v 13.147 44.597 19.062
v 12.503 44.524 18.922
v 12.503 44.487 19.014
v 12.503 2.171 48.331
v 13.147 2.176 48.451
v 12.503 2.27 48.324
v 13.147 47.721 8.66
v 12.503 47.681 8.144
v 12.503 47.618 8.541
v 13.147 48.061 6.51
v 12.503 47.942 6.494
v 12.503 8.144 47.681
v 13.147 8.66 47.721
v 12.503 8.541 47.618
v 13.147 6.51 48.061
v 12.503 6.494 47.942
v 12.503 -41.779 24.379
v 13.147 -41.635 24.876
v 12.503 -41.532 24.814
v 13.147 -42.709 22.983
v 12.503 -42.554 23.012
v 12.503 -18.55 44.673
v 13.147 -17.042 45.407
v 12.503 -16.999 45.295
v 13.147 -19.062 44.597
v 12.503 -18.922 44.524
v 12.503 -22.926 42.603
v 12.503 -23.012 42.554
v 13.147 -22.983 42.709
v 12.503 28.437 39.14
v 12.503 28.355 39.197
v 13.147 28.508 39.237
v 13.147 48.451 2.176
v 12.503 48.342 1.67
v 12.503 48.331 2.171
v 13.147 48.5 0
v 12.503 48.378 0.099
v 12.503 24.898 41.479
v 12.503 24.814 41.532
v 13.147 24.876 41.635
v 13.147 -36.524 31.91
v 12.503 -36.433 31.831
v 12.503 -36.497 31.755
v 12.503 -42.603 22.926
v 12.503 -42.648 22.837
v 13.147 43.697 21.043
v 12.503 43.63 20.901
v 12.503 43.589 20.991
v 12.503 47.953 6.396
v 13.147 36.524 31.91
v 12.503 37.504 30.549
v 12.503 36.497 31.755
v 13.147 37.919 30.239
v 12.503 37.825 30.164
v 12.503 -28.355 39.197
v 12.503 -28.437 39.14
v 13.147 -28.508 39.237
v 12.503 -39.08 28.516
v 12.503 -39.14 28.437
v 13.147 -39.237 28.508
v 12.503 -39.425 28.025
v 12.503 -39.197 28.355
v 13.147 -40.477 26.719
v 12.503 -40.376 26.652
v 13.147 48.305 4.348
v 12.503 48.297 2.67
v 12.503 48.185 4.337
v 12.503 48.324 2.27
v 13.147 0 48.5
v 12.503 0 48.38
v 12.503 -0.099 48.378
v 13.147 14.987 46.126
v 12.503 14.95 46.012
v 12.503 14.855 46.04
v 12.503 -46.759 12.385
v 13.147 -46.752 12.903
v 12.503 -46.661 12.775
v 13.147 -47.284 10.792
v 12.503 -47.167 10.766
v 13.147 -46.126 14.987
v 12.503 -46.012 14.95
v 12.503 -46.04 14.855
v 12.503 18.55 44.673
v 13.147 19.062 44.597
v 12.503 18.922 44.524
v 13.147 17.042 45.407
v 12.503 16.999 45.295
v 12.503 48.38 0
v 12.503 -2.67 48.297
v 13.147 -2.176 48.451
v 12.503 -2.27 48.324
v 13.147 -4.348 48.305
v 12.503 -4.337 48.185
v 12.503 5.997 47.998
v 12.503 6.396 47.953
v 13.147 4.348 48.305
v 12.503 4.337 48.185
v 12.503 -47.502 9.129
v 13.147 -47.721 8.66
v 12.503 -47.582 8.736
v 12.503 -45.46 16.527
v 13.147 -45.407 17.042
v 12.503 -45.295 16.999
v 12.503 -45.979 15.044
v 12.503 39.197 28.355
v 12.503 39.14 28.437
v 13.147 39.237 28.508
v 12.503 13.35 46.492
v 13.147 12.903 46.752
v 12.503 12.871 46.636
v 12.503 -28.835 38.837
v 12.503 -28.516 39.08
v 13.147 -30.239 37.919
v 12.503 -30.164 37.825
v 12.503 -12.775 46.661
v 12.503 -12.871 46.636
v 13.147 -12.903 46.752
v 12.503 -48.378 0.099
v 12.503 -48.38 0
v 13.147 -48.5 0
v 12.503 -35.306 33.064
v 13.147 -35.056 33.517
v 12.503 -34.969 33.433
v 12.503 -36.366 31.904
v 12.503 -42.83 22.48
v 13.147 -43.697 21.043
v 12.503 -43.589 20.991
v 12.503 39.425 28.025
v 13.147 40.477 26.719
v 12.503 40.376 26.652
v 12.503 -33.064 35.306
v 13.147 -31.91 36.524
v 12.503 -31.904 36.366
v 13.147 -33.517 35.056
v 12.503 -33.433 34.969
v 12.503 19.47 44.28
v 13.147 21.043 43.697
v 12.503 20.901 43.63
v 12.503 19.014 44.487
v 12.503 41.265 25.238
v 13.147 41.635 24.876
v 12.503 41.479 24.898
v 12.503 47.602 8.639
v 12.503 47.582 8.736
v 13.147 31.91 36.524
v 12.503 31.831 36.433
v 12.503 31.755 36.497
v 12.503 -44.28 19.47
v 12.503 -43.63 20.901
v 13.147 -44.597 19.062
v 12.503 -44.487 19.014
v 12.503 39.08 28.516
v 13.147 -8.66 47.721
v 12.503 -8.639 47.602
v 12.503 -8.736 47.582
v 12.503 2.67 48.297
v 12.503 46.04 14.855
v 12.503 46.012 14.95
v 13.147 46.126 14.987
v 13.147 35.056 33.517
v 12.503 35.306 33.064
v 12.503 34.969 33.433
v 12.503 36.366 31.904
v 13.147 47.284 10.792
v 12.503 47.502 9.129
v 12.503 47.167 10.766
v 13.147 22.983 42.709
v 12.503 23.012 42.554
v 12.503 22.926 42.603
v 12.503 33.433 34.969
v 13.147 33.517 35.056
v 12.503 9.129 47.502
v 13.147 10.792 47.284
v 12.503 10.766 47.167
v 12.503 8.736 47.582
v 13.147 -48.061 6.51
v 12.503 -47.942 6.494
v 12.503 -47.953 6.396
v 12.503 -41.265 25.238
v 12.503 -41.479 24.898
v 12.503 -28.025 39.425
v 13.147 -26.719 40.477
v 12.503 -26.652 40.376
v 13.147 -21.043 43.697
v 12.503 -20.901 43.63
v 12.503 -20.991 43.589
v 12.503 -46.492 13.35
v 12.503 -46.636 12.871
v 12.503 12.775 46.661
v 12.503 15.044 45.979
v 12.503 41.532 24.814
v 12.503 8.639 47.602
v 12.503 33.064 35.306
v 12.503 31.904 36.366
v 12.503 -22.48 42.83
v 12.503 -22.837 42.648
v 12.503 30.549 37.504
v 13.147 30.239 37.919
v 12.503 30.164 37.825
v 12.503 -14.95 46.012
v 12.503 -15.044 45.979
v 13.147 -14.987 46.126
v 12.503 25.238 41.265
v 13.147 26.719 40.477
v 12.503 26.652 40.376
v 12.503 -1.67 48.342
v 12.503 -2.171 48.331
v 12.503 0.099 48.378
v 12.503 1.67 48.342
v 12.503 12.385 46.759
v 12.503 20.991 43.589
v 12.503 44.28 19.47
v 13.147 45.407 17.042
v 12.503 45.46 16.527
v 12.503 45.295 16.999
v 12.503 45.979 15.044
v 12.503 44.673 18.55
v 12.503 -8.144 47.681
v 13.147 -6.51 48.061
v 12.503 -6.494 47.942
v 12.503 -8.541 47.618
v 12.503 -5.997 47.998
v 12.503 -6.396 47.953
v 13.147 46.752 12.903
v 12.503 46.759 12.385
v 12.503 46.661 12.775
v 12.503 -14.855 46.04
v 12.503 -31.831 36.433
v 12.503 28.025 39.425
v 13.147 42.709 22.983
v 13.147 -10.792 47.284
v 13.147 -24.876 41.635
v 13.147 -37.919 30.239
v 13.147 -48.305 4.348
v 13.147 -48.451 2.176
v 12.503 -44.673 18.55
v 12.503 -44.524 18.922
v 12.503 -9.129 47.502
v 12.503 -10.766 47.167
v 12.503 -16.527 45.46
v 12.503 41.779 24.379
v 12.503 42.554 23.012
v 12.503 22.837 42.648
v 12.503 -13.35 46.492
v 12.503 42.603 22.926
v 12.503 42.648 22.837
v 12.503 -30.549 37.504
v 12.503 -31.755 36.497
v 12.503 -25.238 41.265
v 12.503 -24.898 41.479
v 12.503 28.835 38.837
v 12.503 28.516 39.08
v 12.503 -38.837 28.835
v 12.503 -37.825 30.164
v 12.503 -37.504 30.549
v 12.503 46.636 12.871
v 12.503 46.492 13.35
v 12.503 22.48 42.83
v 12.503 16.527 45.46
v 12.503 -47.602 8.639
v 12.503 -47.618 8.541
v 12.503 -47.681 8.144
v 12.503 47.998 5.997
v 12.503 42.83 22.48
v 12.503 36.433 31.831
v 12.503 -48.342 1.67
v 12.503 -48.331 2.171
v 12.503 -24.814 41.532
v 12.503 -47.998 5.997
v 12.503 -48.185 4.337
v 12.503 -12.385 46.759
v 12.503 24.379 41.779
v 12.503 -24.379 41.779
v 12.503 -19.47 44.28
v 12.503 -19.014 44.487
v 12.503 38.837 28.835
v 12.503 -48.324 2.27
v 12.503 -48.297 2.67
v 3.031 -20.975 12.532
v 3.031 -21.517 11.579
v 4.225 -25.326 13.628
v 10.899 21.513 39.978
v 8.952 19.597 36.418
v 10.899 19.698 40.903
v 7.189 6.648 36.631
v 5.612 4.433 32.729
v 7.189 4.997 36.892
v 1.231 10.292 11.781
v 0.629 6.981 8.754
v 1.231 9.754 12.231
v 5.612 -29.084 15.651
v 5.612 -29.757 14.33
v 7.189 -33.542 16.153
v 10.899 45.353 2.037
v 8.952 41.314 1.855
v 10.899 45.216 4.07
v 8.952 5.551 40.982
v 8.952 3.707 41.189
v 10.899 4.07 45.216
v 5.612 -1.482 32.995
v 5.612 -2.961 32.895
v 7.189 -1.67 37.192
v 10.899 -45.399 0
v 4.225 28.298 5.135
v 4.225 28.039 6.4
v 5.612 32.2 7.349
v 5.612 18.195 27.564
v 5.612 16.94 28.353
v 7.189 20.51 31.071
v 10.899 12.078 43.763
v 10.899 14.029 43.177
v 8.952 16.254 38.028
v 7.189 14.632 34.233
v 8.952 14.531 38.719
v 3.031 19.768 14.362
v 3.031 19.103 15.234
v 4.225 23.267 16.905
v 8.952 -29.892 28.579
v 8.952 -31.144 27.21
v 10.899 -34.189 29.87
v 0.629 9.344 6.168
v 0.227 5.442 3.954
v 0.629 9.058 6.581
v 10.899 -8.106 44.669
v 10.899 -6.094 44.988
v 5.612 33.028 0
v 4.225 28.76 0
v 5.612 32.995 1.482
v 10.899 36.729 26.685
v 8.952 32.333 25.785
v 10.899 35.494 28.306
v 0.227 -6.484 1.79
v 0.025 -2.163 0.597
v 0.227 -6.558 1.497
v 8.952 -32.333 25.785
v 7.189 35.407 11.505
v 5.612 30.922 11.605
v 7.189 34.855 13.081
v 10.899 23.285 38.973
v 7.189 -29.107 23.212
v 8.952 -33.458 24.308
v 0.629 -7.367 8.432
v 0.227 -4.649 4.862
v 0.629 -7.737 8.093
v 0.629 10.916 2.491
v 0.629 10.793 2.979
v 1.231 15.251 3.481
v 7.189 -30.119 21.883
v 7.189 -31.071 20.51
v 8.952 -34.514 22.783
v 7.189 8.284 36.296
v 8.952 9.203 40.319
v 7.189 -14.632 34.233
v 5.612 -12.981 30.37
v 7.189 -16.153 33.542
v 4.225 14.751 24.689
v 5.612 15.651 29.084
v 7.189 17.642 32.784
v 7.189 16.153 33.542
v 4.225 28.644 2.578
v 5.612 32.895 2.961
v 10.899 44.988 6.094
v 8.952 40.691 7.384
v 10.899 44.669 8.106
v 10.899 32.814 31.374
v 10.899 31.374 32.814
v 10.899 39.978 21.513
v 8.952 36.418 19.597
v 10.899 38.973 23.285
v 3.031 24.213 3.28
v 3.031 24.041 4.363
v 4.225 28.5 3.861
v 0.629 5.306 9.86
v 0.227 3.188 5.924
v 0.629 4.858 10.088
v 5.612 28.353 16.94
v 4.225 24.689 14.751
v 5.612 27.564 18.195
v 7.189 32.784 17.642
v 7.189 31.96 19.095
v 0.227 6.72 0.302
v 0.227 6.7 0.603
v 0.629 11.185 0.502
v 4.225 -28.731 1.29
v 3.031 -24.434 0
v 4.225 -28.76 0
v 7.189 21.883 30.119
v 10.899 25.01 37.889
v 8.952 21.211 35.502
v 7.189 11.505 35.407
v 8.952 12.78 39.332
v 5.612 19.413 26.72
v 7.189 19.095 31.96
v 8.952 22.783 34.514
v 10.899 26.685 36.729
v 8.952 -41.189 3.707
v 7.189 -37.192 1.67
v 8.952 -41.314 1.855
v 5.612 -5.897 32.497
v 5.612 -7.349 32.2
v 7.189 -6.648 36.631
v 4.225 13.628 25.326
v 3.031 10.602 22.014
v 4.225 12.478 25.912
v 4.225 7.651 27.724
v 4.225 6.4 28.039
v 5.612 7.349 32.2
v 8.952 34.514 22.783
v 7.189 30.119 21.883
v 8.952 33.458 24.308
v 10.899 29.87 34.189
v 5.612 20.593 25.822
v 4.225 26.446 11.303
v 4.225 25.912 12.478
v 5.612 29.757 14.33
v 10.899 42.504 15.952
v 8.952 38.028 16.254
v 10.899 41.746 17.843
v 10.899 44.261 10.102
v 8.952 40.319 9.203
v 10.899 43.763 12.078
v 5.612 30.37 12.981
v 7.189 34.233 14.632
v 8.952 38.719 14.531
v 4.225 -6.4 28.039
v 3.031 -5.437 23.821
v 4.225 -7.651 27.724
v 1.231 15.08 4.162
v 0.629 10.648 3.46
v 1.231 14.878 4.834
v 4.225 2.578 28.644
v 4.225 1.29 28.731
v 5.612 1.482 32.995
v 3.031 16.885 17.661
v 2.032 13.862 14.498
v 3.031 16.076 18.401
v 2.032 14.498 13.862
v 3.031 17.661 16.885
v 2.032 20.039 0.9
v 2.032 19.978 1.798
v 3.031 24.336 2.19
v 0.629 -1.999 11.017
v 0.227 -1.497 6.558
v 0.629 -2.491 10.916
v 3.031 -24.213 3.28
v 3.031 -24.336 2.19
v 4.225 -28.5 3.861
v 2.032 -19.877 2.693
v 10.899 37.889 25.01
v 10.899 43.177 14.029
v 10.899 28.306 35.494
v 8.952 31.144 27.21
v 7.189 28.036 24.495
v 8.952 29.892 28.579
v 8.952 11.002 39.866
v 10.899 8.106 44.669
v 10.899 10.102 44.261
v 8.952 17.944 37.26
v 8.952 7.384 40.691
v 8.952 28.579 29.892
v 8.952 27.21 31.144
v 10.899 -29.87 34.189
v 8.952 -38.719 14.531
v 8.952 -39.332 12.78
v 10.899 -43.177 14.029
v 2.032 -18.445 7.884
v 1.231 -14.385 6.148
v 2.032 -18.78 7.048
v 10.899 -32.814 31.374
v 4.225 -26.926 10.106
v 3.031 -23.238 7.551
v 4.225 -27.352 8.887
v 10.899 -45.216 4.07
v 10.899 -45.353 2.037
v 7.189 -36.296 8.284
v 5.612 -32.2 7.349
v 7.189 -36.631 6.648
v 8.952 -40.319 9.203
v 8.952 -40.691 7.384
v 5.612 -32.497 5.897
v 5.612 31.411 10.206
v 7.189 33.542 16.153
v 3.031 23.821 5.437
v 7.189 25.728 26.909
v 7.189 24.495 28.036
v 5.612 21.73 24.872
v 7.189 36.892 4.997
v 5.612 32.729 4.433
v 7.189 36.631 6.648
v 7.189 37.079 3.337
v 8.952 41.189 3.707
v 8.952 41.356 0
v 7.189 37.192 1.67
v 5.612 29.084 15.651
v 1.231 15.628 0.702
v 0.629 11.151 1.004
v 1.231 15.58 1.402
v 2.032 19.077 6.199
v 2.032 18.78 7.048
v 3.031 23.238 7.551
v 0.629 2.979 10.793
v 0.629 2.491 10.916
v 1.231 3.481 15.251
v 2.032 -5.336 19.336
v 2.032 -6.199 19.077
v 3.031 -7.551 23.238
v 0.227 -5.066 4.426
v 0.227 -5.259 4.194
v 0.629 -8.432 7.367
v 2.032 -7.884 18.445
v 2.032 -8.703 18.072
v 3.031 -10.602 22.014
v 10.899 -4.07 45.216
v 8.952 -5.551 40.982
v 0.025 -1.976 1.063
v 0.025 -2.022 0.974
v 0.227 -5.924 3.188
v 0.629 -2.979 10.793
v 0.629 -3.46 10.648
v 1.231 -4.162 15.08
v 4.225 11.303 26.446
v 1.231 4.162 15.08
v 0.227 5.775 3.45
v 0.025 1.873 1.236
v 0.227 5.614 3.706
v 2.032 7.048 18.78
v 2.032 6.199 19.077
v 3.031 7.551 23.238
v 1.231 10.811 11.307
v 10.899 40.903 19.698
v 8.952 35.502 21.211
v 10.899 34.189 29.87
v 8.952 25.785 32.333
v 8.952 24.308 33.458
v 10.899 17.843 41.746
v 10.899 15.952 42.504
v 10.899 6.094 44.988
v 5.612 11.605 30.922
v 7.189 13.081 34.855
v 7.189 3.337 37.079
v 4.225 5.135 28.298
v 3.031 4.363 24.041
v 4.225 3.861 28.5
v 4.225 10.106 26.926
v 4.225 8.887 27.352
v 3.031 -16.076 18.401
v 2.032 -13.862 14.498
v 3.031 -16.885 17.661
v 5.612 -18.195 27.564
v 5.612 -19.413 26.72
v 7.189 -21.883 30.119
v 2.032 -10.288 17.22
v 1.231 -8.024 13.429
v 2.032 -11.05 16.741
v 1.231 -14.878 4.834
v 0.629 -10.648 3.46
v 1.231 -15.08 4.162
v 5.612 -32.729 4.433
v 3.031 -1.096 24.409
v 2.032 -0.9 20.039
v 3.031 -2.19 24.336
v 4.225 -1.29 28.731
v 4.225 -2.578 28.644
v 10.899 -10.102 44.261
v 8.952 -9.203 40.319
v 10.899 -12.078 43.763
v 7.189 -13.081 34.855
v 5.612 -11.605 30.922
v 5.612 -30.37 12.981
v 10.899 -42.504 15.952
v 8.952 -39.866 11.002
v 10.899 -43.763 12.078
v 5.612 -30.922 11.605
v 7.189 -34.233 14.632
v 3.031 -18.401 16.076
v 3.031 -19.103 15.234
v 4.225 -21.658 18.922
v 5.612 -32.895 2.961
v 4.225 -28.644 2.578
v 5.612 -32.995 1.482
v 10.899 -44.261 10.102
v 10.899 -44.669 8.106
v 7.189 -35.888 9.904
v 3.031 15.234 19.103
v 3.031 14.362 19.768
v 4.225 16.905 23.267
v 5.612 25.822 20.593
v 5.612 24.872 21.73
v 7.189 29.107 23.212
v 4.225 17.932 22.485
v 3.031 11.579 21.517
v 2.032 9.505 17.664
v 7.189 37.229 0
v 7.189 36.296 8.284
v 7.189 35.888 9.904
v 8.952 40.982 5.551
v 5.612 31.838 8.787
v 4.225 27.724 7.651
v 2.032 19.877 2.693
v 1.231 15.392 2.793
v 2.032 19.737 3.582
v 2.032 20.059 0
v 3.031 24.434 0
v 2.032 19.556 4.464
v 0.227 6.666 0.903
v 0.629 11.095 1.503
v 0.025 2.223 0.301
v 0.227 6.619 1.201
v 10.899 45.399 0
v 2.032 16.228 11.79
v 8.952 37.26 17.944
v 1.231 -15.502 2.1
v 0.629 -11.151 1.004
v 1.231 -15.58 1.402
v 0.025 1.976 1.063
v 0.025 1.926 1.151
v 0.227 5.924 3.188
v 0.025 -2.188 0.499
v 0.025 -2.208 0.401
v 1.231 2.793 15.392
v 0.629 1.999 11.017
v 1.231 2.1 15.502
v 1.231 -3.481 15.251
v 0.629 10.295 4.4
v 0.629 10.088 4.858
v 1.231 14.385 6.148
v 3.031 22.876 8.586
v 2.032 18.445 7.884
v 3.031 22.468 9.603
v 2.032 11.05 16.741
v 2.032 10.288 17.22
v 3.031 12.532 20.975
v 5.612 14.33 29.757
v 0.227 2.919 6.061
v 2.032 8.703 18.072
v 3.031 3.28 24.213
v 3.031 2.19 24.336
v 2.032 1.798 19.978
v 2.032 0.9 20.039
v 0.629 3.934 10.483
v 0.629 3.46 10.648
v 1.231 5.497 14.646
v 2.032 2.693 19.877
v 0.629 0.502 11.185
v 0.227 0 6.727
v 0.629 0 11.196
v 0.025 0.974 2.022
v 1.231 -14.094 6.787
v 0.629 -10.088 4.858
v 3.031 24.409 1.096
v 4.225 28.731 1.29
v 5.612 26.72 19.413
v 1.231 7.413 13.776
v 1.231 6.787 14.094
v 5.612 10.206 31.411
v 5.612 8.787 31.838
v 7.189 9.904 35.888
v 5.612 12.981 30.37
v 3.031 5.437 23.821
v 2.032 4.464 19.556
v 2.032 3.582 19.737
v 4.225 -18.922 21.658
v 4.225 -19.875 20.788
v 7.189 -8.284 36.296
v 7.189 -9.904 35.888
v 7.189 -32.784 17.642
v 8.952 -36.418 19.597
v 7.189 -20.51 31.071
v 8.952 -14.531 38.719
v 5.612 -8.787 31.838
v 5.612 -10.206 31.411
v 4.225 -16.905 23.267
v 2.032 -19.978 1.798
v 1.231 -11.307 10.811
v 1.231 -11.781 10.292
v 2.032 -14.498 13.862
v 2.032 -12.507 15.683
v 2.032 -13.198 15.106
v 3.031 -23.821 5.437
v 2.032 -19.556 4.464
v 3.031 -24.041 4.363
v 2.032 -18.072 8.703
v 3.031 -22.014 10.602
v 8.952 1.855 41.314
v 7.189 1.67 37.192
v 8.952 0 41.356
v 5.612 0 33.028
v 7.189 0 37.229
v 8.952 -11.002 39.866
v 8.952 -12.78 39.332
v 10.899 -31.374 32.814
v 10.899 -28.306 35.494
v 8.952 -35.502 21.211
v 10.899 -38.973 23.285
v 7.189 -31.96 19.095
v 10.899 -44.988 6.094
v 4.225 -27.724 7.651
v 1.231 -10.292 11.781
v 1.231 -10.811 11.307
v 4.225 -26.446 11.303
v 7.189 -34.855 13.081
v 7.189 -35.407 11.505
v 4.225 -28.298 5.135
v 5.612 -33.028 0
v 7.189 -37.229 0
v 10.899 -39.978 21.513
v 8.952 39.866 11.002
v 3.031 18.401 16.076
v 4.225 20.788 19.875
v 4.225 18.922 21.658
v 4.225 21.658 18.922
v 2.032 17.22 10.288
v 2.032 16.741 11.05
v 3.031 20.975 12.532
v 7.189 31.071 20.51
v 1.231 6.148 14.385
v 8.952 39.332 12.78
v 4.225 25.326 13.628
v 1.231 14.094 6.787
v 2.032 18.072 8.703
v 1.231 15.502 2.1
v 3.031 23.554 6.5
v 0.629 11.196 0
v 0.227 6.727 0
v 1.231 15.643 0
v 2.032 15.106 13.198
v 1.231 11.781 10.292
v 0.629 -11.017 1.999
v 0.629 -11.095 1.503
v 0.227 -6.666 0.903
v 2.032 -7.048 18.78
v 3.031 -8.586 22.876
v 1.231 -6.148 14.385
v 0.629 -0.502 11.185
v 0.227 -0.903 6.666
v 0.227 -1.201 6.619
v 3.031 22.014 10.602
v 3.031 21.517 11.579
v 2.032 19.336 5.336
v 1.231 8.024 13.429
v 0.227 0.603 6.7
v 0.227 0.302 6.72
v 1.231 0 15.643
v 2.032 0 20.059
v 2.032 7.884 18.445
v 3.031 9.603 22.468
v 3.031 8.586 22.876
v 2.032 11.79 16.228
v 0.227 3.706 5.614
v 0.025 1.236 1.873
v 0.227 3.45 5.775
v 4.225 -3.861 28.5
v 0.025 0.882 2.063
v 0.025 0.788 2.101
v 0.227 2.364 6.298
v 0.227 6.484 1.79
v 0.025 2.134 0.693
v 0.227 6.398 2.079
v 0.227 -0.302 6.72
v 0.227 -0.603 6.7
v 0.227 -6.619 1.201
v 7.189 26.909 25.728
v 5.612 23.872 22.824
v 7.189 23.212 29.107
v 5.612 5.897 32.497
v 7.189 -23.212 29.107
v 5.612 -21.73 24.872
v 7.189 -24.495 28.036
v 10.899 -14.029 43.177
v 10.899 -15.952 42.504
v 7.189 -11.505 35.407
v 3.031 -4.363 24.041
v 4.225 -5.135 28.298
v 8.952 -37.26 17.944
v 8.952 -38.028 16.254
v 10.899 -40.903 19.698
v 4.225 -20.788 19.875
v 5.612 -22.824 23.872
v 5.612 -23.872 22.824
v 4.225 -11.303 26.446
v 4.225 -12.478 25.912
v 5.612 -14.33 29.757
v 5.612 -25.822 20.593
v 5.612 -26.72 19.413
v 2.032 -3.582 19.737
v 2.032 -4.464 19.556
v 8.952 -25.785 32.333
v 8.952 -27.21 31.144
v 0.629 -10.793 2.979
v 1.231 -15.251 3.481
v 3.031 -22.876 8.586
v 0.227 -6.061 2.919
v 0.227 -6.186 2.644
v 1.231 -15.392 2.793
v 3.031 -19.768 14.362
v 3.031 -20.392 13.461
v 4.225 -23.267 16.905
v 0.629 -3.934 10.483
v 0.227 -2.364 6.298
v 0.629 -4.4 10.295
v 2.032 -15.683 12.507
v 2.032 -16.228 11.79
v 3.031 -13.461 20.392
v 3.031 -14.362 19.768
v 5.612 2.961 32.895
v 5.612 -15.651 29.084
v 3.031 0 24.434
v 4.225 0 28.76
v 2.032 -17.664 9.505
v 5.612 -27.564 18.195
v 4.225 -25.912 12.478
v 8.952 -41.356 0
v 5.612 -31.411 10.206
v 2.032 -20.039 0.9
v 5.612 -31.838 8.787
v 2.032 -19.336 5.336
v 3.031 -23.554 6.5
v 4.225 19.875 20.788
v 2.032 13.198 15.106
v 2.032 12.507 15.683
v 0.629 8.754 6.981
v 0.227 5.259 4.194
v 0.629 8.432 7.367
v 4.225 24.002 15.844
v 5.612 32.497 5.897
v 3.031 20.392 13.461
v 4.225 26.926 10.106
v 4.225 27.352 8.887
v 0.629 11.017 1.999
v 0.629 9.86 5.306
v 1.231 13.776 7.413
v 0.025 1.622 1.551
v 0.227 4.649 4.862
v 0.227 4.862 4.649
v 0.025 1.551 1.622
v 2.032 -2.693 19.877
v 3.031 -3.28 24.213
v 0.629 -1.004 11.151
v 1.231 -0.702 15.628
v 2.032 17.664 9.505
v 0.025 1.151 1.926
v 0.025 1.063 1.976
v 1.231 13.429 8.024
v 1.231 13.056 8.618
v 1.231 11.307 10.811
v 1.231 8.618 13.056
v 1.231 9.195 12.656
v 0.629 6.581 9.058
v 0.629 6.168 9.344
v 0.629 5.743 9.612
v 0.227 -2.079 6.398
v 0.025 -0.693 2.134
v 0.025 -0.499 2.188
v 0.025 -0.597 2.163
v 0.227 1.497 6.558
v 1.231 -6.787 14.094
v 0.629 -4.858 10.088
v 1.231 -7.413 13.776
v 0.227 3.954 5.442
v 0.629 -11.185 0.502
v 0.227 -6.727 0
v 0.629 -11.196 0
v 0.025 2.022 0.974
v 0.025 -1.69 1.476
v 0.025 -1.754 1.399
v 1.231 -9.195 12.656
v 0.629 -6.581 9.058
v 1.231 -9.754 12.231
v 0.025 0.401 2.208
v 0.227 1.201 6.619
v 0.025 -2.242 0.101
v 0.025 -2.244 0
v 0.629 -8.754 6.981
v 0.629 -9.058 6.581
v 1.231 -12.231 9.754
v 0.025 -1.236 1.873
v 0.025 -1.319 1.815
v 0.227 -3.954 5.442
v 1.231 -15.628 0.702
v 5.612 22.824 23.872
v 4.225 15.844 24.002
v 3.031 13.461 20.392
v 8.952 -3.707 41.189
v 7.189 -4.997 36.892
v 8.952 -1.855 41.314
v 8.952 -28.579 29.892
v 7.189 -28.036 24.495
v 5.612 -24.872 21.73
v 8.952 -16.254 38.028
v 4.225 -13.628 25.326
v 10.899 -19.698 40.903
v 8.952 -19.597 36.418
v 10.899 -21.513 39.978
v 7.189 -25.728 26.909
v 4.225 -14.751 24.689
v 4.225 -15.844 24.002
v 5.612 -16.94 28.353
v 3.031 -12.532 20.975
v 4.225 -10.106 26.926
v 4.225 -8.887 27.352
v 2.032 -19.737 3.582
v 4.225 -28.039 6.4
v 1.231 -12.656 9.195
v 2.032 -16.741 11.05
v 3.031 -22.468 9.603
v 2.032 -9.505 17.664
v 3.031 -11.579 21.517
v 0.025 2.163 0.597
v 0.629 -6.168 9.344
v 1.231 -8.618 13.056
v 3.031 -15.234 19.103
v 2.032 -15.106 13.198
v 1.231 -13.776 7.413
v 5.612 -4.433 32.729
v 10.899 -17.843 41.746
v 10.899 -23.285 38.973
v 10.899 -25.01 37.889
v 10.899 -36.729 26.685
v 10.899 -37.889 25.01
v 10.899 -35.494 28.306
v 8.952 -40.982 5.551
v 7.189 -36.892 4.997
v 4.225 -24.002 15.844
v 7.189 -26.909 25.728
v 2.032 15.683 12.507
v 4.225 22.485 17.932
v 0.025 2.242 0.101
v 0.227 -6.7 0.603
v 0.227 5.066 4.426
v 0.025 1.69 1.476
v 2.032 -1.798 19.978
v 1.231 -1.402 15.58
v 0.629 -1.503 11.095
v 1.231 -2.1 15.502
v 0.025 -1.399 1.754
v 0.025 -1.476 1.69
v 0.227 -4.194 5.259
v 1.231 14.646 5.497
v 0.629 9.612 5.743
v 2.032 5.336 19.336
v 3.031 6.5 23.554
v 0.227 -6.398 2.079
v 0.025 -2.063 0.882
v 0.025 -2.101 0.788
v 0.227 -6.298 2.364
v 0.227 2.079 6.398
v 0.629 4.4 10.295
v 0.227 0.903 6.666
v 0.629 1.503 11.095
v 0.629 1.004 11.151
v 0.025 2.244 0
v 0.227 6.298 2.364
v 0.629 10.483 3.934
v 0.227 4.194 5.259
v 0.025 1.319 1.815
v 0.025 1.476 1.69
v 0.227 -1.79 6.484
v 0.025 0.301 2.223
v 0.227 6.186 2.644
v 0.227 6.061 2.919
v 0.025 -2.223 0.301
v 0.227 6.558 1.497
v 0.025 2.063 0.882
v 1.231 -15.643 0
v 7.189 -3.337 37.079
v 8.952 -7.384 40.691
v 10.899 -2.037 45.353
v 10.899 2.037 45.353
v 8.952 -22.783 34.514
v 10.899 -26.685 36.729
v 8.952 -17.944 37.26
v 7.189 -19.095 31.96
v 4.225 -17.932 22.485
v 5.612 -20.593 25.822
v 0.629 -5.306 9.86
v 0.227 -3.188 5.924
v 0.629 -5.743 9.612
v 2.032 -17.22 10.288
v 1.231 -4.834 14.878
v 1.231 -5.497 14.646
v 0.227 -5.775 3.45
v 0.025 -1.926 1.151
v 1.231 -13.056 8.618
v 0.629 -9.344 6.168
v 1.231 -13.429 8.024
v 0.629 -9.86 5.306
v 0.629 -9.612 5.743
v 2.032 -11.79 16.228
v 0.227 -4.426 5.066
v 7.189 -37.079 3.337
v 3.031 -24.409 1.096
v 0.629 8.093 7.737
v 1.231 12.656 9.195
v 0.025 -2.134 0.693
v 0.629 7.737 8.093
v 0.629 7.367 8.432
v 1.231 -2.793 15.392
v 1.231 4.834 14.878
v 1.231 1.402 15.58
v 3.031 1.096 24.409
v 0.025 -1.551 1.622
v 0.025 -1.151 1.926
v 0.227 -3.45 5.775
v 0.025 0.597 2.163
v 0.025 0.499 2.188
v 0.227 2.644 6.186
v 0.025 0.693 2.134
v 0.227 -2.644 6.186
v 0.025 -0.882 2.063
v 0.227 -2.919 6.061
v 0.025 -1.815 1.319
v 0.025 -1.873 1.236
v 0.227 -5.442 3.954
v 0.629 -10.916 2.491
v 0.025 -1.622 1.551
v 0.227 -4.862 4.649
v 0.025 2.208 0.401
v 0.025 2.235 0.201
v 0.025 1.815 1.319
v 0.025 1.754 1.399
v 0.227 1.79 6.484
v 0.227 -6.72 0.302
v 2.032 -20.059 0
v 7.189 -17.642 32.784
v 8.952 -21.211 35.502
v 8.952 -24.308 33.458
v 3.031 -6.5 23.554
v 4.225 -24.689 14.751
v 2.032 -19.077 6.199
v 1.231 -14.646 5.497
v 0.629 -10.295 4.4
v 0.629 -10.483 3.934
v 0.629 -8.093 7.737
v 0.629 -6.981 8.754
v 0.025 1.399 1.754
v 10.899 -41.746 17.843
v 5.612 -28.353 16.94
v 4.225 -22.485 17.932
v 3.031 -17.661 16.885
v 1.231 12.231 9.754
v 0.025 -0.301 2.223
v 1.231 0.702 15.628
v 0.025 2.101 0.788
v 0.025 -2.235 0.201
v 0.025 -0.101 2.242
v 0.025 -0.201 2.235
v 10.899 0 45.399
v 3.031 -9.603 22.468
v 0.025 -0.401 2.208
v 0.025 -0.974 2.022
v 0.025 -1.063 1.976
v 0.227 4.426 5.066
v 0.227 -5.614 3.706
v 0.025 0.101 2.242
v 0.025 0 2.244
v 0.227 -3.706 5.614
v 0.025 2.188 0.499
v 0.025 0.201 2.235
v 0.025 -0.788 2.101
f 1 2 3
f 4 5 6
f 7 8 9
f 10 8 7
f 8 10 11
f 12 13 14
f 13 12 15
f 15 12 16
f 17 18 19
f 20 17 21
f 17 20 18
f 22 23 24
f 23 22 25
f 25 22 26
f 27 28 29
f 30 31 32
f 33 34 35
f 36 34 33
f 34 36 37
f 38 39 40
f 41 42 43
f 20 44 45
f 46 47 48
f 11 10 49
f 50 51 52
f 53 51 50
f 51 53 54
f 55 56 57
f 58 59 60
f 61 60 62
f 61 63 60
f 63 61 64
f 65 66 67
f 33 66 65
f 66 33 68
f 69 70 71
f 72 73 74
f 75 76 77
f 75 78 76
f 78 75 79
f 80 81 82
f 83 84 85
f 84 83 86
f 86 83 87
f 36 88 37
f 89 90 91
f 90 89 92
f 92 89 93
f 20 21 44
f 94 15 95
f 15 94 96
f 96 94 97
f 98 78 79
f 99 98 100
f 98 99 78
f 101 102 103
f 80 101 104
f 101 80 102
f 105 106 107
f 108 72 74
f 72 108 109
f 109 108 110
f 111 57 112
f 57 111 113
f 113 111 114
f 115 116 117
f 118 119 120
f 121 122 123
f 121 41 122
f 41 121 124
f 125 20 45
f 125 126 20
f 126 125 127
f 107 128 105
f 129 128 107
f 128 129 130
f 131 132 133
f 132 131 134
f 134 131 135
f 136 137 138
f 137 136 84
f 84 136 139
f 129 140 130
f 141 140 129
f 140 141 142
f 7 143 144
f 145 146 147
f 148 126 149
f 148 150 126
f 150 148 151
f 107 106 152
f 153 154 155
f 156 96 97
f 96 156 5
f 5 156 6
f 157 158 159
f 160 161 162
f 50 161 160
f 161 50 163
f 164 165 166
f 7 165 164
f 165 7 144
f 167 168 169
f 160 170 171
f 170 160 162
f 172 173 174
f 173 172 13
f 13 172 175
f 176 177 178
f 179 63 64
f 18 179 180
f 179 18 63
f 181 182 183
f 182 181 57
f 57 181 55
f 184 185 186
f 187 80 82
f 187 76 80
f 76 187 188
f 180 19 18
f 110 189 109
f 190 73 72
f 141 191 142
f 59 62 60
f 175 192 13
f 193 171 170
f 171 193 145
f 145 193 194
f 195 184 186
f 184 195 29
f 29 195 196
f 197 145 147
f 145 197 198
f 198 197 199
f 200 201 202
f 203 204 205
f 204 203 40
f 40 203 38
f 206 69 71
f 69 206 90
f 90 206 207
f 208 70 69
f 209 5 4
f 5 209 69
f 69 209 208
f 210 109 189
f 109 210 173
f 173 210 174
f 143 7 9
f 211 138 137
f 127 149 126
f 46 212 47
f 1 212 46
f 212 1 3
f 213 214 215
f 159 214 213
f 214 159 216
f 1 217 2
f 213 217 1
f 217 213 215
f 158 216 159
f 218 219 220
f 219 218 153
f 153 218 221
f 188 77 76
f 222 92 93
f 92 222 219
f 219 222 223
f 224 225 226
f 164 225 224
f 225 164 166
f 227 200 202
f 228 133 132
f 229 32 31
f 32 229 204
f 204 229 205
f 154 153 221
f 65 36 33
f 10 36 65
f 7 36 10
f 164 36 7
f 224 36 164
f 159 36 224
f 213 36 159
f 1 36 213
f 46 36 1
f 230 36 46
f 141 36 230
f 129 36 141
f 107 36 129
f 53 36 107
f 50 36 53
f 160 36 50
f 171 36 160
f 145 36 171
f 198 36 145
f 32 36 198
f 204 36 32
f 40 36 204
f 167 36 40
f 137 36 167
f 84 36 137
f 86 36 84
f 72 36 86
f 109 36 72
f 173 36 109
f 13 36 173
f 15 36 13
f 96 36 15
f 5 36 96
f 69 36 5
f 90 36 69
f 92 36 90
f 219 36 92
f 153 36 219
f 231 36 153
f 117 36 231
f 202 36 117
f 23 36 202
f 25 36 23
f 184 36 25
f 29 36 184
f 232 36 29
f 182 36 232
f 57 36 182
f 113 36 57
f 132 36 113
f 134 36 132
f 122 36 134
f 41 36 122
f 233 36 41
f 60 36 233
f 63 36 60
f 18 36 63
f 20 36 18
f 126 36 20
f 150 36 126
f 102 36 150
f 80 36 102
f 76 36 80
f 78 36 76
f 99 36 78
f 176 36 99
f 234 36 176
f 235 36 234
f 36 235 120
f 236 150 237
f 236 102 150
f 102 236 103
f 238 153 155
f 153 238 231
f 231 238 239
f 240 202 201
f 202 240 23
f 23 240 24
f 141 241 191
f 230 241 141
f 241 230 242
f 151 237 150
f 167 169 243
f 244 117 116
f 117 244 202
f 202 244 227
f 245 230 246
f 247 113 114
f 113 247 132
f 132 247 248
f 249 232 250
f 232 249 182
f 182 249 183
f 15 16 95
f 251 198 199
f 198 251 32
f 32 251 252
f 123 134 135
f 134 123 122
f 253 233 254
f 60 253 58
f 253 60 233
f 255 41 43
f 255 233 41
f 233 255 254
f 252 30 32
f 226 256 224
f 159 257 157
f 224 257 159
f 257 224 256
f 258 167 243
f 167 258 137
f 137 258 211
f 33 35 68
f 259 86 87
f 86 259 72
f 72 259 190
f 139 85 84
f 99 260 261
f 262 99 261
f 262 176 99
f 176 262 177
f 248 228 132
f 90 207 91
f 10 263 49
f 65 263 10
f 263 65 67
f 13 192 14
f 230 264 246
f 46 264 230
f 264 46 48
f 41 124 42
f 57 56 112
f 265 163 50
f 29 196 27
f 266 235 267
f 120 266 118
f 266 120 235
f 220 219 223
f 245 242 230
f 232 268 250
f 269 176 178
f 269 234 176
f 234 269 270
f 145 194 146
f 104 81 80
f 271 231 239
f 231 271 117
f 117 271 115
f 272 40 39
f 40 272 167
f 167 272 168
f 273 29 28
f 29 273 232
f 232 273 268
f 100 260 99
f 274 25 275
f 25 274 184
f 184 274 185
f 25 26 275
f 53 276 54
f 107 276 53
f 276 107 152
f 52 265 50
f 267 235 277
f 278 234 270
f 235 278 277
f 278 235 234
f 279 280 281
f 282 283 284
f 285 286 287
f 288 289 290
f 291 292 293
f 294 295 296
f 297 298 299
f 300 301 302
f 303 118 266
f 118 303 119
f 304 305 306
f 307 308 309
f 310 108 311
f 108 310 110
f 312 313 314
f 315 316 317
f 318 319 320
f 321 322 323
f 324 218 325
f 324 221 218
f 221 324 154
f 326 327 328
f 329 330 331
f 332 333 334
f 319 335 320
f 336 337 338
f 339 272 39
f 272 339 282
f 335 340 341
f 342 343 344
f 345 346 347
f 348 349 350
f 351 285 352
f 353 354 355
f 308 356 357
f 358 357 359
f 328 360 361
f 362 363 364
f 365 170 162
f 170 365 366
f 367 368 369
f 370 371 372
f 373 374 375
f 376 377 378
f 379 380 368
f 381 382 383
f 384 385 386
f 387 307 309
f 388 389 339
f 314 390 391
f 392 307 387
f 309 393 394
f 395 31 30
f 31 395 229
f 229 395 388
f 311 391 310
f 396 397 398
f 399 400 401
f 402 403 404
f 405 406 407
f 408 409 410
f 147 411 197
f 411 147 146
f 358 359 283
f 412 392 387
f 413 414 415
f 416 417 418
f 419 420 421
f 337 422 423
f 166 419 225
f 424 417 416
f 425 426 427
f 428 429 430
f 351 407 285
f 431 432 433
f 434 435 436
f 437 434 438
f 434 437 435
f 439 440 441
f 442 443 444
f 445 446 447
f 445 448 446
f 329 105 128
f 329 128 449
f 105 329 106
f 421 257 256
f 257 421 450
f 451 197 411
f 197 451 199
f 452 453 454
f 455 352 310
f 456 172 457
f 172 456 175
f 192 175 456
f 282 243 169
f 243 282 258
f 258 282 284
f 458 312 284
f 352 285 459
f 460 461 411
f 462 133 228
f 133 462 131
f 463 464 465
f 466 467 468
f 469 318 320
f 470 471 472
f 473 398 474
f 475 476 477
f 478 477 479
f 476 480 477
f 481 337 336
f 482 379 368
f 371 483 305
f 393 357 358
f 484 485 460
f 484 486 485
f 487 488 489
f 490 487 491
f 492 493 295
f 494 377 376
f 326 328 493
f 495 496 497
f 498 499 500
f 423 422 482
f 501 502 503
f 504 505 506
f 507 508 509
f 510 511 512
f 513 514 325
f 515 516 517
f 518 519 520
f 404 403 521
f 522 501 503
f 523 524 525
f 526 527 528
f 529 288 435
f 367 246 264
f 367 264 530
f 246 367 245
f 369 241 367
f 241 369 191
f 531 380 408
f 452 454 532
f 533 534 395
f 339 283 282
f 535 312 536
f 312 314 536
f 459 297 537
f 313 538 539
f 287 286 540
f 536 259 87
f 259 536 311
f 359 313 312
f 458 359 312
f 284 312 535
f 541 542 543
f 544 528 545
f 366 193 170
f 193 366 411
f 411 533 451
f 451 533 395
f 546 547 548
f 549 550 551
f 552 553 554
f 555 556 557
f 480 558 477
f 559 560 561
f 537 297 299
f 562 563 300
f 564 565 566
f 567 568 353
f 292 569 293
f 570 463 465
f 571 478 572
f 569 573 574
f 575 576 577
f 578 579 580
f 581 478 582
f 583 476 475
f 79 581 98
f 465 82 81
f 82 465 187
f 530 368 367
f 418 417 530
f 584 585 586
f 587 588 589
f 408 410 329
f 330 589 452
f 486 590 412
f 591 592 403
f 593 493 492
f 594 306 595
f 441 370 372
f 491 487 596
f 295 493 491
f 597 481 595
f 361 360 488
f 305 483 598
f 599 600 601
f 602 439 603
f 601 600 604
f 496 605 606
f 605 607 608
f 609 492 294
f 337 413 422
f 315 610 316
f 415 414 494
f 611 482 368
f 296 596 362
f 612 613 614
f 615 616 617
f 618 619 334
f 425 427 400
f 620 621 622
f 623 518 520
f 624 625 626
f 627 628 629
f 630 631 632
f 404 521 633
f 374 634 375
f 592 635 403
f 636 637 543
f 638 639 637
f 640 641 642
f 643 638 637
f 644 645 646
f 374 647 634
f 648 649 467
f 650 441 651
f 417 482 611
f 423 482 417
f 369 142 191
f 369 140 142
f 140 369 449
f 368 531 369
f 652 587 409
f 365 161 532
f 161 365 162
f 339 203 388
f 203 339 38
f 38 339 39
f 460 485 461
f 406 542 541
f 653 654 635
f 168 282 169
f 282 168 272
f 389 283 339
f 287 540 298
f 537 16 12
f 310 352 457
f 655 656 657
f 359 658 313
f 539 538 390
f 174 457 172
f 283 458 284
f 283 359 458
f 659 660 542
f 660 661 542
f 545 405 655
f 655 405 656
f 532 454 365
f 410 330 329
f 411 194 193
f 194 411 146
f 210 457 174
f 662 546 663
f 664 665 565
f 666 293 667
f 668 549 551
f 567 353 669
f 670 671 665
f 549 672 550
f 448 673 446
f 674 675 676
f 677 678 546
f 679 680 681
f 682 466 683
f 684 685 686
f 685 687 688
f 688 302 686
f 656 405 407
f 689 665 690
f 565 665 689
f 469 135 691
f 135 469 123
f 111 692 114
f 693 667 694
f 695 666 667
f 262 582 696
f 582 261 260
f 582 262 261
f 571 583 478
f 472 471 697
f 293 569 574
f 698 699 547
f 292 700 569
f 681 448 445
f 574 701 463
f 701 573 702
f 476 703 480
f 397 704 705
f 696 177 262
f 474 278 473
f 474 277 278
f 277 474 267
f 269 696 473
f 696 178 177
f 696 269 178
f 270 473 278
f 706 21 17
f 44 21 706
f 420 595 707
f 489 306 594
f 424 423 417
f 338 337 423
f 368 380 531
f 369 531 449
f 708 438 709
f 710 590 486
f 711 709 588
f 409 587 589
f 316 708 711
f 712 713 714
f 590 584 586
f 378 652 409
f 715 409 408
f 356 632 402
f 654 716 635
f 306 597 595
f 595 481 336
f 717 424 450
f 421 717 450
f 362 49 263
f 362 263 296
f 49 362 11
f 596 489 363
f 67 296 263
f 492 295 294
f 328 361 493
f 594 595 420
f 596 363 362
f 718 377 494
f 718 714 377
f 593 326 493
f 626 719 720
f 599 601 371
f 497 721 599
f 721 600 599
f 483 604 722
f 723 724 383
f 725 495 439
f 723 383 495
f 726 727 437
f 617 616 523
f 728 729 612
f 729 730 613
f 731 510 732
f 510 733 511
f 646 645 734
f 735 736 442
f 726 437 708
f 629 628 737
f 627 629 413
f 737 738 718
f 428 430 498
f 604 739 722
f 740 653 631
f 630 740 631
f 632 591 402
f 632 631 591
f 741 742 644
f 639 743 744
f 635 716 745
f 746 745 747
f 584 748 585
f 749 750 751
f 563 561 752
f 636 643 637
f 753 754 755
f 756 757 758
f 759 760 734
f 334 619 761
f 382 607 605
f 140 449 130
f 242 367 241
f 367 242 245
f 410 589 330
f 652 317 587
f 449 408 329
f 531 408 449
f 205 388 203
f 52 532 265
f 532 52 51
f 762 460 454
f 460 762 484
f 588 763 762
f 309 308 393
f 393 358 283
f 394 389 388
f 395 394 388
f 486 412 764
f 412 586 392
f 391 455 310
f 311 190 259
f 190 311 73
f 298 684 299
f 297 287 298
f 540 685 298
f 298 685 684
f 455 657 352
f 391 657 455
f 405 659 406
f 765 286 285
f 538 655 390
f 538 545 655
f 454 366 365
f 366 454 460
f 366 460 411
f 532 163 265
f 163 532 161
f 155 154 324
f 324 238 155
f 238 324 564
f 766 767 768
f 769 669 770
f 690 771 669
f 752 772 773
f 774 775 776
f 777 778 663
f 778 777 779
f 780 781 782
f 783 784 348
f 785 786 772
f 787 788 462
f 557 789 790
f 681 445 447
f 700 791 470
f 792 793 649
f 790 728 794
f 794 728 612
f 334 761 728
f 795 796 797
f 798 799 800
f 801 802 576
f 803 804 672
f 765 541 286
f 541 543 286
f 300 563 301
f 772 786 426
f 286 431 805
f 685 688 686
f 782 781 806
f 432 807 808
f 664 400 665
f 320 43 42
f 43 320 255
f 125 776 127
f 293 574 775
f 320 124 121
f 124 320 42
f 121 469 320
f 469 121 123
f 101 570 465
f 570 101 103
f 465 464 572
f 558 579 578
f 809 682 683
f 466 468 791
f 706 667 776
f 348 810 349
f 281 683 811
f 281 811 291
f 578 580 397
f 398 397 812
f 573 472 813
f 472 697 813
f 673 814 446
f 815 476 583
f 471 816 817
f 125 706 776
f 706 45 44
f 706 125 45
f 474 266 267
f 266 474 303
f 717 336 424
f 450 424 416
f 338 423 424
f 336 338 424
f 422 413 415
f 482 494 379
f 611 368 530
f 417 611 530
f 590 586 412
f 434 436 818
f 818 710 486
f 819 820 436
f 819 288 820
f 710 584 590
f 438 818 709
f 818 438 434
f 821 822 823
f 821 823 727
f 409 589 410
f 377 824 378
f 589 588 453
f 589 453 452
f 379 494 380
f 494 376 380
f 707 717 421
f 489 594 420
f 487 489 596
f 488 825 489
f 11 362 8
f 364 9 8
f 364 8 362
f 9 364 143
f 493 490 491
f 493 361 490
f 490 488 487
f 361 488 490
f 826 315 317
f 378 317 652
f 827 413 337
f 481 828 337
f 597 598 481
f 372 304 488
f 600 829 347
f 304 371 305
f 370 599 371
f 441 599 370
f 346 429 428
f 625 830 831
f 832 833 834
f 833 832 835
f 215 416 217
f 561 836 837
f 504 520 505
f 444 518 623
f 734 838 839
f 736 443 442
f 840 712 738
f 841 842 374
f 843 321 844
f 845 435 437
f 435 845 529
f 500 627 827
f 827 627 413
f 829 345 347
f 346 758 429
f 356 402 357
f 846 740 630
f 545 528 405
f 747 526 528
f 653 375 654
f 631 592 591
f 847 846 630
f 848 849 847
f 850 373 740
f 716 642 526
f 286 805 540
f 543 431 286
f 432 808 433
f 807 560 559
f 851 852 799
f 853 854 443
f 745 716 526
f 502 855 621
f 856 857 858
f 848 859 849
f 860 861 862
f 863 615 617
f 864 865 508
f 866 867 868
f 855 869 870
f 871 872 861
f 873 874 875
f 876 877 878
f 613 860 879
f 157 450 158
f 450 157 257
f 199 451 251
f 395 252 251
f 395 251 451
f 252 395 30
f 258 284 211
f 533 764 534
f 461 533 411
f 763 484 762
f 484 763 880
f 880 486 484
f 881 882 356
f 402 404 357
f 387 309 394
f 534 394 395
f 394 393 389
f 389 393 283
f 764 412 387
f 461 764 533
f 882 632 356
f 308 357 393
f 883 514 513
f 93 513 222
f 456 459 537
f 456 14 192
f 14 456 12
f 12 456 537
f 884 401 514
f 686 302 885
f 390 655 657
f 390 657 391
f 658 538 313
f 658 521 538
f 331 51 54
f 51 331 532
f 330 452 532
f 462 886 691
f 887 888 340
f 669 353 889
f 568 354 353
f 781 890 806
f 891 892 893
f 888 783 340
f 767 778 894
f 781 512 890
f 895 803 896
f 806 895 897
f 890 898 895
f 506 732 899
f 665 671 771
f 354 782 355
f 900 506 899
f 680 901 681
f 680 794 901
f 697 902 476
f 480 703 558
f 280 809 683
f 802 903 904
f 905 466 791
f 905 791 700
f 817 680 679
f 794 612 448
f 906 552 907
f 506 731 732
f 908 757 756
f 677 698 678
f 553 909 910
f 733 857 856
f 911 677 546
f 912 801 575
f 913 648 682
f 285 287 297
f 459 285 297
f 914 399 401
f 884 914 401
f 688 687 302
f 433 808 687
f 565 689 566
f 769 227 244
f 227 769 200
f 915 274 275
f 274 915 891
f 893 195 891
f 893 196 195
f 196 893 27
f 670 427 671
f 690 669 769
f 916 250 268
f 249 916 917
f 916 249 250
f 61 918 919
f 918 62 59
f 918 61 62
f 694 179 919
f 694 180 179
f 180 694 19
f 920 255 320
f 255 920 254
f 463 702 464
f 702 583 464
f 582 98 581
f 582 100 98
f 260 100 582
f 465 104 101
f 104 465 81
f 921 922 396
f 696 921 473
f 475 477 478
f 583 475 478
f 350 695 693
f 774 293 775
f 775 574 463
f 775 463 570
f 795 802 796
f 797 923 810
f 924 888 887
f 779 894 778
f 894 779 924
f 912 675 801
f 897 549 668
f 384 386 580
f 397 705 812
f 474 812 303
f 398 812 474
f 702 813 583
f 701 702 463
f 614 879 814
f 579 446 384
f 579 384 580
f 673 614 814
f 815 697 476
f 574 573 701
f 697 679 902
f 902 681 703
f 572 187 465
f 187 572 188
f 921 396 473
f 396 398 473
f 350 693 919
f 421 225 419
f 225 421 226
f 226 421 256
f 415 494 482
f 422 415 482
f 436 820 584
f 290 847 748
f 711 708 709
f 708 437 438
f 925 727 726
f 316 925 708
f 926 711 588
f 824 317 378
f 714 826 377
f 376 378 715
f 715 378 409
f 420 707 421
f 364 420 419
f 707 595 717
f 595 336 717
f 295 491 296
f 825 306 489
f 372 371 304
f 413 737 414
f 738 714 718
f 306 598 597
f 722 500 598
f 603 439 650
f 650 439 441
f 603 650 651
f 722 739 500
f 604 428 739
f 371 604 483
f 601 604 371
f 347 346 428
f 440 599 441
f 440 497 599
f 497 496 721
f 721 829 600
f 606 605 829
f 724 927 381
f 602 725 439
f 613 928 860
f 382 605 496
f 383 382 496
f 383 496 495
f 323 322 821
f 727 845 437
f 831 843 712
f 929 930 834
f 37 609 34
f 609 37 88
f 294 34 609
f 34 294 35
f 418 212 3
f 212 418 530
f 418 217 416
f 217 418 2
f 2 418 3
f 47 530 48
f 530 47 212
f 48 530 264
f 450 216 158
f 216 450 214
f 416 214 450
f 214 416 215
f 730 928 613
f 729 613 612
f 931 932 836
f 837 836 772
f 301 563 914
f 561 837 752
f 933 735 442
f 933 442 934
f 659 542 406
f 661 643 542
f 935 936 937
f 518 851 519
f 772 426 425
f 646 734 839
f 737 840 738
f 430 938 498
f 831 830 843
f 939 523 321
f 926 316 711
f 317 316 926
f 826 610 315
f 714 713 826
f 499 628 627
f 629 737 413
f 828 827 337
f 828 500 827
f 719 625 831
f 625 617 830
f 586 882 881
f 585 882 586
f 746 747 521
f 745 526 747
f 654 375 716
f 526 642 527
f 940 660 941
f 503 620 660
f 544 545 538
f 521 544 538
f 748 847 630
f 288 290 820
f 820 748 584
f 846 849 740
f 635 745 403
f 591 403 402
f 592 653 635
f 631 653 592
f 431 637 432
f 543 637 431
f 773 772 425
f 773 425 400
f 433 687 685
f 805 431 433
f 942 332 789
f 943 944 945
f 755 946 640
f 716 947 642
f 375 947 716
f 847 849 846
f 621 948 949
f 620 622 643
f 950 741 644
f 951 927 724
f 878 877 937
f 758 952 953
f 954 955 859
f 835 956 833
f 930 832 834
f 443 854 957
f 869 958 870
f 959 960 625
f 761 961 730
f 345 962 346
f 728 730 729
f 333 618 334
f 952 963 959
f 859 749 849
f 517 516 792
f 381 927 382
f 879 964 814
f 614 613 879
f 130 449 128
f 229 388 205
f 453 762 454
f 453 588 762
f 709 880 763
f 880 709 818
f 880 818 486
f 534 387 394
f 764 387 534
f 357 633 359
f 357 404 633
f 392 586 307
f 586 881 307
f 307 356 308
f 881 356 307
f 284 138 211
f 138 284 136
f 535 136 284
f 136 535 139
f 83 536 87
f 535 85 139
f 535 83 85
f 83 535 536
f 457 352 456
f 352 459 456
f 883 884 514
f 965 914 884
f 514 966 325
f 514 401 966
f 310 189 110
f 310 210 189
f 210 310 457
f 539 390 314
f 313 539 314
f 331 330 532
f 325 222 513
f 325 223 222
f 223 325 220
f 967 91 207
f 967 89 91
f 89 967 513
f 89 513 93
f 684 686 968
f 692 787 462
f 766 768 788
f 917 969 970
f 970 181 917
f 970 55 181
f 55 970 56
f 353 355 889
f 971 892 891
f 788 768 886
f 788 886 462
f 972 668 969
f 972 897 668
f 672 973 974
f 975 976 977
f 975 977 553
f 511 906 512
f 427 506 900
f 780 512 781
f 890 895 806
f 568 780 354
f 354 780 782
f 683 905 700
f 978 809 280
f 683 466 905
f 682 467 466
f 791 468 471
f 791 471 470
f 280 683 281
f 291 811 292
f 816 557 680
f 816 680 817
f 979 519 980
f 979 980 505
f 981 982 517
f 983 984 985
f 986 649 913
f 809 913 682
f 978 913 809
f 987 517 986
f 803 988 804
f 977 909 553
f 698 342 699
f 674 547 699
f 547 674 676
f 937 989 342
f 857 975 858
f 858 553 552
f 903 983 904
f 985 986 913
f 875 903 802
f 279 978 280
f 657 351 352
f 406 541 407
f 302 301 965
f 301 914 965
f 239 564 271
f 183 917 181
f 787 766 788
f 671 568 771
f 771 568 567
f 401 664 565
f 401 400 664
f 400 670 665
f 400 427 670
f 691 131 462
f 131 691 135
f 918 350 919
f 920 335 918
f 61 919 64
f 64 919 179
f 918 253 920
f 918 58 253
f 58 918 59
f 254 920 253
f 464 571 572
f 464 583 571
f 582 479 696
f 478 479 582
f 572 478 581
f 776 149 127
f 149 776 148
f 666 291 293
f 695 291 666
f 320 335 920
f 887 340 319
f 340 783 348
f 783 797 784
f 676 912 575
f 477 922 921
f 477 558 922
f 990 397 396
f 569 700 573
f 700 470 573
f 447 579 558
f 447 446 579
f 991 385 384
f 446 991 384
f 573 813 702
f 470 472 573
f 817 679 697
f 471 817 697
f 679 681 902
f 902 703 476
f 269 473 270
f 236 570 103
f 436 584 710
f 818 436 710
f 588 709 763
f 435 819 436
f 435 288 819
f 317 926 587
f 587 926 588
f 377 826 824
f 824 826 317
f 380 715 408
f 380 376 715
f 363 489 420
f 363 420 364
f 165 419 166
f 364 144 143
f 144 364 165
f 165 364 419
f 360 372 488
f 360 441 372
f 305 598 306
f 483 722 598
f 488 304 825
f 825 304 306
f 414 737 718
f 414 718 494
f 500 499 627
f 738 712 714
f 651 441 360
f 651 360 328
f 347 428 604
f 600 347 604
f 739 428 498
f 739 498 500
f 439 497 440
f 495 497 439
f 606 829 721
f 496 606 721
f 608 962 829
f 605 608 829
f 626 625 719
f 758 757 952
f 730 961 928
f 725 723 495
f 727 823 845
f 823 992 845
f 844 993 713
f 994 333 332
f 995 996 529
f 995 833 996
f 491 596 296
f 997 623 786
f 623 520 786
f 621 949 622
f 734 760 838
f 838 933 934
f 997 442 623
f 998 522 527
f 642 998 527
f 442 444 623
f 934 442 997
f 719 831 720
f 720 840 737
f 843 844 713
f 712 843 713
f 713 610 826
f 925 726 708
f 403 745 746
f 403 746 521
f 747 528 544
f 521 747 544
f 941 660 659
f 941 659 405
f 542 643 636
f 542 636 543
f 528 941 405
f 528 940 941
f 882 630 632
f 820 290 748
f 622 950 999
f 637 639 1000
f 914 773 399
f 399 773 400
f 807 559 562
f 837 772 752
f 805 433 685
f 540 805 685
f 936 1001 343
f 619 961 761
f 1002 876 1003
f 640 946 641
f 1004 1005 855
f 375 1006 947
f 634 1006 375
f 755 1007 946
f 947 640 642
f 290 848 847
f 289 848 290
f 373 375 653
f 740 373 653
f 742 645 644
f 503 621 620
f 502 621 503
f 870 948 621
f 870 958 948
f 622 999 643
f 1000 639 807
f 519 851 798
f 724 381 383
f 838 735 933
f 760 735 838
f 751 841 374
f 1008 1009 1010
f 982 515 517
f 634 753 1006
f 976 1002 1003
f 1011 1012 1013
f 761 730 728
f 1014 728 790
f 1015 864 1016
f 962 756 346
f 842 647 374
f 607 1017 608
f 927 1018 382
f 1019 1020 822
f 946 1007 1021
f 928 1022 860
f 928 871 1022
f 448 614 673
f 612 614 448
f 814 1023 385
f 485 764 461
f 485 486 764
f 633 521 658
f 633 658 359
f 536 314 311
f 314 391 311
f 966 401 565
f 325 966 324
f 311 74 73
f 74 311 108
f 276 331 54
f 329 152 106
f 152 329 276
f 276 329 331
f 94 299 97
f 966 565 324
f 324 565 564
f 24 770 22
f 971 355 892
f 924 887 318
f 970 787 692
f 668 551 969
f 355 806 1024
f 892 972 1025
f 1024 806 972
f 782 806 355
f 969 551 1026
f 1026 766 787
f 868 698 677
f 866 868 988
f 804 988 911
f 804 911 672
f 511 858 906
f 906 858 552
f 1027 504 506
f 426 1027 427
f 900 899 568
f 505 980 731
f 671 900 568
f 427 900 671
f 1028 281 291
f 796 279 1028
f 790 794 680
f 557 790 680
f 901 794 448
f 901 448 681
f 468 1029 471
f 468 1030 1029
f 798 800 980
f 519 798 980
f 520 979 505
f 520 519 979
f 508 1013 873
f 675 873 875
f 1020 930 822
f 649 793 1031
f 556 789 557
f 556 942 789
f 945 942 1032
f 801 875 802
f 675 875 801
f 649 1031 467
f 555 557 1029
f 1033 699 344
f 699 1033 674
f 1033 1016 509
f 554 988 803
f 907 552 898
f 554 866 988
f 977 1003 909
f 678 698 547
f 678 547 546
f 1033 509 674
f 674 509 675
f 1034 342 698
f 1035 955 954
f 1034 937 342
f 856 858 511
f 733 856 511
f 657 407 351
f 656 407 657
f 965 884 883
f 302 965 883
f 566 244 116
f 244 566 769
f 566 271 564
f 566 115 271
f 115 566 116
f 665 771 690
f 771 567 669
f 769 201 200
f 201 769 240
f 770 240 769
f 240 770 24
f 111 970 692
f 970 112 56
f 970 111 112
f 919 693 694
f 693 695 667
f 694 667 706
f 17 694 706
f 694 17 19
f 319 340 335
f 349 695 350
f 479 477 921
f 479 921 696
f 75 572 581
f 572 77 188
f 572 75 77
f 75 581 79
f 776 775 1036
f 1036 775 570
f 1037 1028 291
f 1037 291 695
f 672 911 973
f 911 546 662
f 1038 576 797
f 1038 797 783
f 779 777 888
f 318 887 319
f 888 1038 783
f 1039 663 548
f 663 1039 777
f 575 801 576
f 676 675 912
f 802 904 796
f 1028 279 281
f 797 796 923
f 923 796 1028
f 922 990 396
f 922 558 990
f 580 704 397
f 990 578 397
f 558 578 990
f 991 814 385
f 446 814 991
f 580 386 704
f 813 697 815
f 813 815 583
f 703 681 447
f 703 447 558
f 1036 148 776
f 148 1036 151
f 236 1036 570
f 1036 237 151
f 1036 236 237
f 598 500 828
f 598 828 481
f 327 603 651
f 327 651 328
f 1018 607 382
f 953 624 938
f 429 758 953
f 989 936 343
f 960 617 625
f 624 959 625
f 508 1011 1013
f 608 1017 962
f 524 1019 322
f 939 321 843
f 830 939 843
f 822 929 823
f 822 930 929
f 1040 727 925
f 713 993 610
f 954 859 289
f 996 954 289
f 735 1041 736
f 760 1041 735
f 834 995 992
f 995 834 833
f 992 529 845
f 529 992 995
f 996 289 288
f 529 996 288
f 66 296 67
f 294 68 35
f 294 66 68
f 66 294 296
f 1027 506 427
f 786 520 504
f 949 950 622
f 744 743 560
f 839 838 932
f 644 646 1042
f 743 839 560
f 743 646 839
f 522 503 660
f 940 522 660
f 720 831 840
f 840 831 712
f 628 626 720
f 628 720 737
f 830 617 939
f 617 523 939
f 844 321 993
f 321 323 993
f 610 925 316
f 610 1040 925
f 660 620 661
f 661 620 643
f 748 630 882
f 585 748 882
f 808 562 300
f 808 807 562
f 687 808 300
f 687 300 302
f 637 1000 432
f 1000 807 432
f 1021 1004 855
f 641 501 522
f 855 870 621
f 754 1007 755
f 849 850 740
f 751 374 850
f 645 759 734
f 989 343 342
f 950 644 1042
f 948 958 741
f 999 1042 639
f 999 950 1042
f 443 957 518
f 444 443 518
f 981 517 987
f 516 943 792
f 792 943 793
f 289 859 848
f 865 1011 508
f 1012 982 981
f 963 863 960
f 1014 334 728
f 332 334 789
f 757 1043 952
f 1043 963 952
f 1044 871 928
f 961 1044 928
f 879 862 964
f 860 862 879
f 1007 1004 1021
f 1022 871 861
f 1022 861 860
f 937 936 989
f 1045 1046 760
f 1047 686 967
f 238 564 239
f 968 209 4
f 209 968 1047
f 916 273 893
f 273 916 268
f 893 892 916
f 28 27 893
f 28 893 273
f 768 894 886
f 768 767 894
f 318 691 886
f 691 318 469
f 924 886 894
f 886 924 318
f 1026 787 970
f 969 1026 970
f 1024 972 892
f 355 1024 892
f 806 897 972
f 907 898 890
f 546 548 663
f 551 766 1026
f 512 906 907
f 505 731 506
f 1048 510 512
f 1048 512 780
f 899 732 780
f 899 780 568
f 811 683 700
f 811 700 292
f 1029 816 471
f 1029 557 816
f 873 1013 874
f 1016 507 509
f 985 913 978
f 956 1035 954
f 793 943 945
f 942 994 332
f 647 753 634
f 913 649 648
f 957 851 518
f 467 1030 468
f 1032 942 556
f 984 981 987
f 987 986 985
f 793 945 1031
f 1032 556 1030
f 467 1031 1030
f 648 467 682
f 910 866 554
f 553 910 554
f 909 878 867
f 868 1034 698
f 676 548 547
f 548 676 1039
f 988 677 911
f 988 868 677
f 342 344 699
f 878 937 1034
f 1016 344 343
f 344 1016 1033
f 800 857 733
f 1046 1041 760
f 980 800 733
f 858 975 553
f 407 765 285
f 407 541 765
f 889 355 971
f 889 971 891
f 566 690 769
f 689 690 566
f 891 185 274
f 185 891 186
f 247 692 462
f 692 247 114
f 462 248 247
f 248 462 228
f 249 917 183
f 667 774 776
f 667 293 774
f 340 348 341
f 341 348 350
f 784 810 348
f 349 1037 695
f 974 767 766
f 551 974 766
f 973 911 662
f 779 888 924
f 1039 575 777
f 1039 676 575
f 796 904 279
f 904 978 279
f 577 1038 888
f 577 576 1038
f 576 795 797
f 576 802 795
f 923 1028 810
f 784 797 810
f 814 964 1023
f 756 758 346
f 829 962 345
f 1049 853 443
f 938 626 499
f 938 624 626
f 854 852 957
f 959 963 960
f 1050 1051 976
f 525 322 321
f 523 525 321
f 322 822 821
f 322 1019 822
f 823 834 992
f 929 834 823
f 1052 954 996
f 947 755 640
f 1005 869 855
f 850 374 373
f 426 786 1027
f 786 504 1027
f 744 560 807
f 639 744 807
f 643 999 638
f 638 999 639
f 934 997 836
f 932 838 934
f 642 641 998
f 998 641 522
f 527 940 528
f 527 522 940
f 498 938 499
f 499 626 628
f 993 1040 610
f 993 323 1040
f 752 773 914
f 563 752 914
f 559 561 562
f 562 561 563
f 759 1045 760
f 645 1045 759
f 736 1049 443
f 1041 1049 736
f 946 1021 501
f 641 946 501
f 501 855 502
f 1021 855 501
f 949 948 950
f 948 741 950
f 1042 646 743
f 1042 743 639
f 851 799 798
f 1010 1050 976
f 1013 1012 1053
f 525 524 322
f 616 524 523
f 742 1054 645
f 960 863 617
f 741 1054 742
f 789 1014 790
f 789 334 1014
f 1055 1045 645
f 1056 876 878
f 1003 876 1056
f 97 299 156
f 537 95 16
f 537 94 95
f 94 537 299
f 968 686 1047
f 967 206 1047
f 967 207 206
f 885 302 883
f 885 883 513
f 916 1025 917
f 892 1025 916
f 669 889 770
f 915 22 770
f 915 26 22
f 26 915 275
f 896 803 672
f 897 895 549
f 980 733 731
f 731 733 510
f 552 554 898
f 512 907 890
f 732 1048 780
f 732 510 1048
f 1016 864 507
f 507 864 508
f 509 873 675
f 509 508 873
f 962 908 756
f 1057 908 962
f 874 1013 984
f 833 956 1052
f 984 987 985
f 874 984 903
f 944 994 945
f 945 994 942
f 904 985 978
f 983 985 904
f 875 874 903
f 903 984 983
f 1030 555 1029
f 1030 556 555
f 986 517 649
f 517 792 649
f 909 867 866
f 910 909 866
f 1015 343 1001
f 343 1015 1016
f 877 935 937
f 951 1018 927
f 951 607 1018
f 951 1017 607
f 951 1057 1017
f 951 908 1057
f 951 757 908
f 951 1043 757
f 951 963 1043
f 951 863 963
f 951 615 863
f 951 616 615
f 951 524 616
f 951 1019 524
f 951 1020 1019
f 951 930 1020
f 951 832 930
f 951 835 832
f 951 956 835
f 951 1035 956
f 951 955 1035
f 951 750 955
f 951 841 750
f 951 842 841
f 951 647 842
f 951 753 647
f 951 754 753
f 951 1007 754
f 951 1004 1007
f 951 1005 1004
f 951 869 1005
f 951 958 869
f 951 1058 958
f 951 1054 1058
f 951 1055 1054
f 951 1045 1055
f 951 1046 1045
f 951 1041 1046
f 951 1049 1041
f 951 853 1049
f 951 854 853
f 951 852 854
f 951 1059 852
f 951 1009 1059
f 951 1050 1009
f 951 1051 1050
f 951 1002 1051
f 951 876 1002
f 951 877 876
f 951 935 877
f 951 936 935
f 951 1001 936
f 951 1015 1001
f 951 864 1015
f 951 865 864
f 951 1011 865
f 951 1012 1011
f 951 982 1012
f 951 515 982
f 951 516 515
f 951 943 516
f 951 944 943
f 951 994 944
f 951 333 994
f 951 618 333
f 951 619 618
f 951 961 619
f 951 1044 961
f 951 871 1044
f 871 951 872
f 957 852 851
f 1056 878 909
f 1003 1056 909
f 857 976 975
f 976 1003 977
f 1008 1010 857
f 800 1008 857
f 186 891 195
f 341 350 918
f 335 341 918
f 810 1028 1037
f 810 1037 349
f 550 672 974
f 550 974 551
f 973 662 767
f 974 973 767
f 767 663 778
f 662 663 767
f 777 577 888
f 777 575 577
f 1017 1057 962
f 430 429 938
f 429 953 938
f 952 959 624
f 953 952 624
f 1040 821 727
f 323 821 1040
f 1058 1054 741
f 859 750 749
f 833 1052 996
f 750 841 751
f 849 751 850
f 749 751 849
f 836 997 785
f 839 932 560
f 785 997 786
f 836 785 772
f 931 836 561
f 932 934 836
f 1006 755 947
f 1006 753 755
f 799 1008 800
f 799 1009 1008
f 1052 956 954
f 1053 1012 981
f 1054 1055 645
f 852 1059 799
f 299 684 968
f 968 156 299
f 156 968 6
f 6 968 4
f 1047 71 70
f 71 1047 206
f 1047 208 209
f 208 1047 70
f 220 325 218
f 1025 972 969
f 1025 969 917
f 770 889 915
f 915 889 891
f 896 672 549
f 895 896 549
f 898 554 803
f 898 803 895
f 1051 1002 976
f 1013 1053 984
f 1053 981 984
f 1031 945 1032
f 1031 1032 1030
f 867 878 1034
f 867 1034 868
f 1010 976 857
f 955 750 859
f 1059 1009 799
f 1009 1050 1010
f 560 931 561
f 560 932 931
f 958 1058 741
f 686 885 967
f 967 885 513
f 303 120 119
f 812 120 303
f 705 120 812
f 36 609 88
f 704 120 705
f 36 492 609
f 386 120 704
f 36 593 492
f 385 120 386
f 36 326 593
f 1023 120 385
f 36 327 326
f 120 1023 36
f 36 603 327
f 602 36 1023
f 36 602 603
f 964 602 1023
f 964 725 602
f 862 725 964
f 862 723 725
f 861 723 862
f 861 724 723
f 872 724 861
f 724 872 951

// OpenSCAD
$fn=140;
//$fa= 6;
//$fs = 100;
r1 = 100; //mm
h = r1-sqrt(r1*r1-(100*100)/4);

intersection()
{
rotate([0,90,0])
intersection()
{
translate([0,0,-.25])
cylinder(d1=92, d2=100-3, h=h);


translate([0,0,r1])
sphere(r=r1);


}

translate([-50,-50,0])
cube([100,100,100]);
}
echo(h);
